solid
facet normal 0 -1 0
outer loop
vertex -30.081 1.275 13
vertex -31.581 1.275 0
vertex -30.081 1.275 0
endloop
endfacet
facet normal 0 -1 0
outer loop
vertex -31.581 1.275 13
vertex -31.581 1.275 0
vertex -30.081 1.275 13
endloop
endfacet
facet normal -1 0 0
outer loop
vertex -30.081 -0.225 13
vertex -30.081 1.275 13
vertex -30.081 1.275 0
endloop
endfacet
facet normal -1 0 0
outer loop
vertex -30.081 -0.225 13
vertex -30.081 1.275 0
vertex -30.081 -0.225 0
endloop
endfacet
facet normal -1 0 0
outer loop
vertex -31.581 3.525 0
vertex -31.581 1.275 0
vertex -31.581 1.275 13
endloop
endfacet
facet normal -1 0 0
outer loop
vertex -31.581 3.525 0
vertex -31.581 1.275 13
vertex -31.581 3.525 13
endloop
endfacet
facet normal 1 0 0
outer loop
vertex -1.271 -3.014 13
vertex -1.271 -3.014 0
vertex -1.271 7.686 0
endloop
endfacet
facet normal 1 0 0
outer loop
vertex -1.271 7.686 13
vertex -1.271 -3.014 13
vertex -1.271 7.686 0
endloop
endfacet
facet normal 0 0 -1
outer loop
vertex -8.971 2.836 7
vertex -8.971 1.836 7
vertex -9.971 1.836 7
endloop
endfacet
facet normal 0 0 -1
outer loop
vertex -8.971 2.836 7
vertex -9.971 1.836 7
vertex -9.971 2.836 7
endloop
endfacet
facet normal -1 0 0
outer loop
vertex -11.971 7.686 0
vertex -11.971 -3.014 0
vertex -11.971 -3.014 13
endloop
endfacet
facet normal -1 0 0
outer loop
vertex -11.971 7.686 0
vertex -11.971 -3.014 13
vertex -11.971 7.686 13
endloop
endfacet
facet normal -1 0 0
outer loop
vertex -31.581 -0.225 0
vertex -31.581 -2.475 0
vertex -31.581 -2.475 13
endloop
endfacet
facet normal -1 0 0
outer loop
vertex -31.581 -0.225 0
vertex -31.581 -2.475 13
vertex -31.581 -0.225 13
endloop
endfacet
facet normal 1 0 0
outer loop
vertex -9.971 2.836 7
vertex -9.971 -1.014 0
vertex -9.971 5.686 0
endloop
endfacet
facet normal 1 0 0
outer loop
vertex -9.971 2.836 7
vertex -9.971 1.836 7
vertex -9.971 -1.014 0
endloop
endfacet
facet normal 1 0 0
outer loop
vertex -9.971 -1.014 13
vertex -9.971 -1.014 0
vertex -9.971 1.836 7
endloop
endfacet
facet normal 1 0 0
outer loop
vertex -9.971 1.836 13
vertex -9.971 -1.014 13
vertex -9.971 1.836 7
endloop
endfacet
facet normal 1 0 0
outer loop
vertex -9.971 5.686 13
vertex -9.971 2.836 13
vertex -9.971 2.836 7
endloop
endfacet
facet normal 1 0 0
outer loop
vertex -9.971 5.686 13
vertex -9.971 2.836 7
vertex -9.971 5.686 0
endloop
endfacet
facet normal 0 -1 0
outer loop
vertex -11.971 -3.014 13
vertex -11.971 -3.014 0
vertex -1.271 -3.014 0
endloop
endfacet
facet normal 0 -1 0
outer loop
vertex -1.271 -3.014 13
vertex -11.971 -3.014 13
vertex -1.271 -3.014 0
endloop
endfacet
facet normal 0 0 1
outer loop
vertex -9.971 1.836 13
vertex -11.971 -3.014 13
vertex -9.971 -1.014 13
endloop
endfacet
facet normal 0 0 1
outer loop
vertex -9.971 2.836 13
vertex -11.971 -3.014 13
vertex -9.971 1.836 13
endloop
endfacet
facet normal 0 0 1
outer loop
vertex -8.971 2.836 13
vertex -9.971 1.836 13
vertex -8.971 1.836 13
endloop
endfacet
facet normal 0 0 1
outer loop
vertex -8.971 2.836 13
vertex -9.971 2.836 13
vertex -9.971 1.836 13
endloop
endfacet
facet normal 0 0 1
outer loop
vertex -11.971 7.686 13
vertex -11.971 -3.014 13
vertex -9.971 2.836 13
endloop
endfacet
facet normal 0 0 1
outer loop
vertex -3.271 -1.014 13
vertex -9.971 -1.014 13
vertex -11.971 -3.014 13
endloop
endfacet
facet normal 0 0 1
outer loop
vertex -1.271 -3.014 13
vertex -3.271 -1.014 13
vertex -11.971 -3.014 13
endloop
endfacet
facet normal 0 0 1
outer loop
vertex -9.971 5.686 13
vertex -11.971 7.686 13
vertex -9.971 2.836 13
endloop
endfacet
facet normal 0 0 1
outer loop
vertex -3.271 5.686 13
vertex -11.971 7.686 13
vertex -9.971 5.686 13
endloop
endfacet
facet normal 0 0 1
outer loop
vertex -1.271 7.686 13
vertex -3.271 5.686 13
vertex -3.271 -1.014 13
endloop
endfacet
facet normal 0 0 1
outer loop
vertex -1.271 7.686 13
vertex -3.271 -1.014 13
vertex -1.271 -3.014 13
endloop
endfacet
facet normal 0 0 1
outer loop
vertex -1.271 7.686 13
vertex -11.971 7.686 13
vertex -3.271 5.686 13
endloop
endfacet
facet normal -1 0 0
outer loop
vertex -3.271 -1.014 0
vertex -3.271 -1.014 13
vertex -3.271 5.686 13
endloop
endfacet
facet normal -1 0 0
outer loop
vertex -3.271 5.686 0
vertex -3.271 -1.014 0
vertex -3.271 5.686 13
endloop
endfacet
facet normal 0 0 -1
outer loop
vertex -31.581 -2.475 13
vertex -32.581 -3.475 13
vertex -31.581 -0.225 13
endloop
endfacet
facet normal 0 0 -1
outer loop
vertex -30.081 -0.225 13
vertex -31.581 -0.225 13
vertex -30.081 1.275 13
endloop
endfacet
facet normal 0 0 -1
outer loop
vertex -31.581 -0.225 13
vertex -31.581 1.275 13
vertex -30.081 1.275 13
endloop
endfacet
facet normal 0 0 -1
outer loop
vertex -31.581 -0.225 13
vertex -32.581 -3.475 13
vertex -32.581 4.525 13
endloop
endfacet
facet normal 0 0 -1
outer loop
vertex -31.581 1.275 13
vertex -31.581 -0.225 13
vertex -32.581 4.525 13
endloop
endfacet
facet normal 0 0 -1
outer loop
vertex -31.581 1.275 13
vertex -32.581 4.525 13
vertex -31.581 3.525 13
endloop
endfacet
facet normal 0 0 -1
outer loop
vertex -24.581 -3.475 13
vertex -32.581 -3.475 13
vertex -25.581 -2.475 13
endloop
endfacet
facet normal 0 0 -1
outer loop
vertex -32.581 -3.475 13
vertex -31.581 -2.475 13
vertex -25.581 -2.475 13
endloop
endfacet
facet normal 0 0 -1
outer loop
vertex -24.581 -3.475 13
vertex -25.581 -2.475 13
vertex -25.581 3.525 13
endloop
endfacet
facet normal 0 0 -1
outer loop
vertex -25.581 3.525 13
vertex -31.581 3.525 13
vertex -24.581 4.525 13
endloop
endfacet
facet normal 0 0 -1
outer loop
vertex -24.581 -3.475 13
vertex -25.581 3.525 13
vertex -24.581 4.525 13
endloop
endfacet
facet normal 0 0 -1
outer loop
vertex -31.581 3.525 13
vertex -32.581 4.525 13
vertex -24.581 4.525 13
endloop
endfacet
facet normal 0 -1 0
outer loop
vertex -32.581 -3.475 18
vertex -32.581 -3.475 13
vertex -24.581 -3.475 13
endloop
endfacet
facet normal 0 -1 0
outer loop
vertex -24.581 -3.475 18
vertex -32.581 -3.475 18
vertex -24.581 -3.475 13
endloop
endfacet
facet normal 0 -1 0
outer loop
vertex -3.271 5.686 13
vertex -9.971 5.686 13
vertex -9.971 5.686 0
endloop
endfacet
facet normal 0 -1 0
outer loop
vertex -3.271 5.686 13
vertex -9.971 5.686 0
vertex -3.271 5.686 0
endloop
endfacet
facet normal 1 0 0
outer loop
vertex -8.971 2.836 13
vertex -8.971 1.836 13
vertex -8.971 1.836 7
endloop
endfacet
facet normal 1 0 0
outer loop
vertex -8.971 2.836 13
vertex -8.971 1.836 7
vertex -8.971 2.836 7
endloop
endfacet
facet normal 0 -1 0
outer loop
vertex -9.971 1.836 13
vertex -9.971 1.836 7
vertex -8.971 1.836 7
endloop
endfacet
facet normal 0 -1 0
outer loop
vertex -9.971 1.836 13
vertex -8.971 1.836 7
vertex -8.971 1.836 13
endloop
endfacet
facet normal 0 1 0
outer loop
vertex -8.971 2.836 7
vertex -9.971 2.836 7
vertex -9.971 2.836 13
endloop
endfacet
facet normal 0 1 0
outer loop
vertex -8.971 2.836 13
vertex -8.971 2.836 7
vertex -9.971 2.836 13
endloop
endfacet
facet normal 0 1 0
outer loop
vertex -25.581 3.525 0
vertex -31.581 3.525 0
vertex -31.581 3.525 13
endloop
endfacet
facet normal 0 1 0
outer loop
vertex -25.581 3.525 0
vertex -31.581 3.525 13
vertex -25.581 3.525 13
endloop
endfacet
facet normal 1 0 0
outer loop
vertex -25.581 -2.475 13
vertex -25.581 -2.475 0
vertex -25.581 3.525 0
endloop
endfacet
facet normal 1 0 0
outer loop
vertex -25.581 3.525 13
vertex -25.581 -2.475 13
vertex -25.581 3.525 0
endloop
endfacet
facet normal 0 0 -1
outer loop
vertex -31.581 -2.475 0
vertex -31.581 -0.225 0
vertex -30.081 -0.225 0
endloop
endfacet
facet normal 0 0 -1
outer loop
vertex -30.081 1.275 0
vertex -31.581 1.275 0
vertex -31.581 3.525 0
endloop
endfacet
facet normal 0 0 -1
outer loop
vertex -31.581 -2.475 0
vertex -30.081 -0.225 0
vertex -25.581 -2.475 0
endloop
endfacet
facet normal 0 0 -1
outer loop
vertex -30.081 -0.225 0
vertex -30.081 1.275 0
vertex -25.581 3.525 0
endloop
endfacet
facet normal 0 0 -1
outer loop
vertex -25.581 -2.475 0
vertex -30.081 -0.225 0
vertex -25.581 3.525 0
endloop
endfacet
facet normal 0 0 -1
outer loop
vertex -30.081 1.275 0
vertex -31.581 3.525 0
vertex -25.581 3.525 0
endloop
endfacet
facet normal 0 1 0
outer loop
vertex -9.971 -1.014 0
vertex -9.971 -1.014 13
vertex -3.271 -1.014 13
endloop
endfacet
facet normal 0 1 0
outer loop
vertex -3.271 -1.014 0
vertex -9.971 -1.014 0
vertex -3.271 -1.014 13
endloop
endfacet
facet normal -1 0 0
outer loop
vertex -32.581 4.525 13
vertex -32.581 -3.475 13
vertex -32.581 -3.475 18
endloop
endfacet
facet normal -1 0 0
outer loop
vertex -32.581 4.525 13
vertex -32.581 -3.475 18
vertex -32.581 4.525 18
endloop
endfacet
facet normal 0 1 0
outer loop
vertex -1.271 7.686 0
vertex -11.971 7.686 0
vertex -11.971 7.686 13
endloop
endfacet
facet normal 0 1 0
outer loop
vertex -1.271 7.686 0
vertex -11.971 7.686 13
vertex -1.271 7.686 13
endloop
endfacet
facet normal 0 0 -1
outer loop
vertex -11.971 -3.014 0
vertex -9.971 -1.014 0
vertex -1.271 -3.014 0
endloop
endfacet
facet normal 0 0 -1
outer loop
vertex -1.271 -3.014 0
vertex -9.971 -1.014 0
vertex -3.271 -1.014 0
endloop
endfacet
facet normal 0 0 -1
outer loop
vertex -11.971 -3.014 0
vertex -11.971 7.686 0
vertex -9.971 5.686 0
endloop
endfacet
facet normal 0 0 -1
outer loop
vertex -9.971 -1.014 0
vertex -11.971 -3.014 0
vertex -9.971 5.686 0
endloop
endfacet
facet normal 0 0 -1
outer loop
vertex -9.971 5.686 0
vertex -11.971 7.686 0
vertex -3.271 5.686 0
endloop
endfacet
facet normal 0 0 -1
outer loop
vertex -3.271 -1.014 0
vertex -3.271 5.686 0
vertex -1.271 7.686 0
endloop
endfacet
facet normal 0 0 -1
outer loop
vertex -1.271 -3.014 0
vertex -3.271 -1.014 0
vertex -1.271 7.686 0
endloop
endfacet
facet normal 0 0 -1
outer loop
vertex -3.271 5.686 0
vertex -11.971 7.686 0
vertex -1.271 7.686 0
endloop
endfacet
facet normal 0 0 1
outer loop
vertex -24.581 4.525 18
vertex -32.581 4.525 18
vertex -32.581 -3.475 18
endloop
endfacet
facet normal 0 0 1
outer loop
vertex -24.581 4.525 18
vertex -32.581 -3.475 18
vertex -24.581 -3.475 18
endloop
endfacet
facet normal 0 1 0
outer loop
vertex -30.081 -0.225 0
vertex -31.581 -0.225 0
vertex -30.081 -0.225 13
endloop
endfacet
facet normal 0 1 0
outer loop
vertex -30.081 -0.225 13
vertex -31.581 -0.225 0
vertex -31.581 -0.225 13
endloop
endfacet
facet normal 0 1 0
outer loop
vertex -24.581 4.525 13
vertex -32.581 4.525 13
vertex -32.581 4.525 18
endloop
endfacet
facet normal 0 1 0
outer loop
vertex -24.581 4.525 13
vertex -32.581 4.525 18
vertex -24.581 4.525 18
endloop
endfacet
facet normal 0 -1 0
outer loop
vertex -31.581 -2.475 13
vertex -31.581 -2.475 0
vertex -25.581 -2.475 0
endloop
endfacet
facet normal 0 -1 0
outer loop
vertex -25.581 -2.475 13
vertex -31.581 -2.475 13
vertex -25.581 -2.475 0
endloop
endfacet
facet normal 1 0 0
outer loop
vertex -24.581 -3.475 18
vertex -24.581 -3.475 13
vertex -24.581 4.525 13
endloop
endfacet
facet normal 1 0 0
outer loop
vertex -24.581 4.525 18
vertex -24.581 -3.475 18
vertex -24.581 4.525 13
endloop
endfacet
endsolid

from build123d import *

# Parameters (mm, degrees)
F0_W      = 10.7
F0_H      = 10.7
F1_DEPTH  = 13
F2_T      = -2
F3_DEPTH  = 25
F4_W      = 6
F4_H      = 6
F5_DEPTH  = 13
F6_W      = 8
F6_H      = 8
F6_W_2    = 6
F6_H_2    = 6
F7_DEPTH  = 5
F8_DEPTH  = 5
F9_W      = 1
F9_H      = 13
F10_DEPTH = 1
F11_W     = 1
F11_H     = 7
F12_DEPTH = 1
F13_W     = 1.5
F13_H     = 13
F14_DEPTH = 1.5


with BuildPart() as f1:
    # F0 (on Top) → F1 (new body)
    with BuildSketch(Plane.XY):
        with Locations((-6.6214689702, 2.3361916789)):
            Rectangle(F0_W, F0_H)
    extrude(amount=F1_DEPTH)

    # F2
    f2_openings = [f1.faces().sort_by_distance(p)[0] for p in [
        (-6.621469, 2.336192, 13),
    ]]
    offset(amount=F2_T, openings=f2_openings)

    # F3 (cut): a face of the model
    f3_faces = [f1.faces().sort_by_distance(p)[0] for p in [
        (-6.6214689702, 2.3361916789, 2),
    ]]
    extrude(f3_faces, amount=-F3_DEPTH, mode=Mode.SUBTRACT)

    # F9 (on face) → F10 (join)
    with BuildSketch(Plane.YZ.offset(-9.9714689702)):
        with Locations((2.3361916789, 6.5)):
            Rectangle(F9_W, F9_H)
    extrude(amount=F10_DEPTH)

    # F11 (on face) → F12 (cut)
    with BuildSketch(Plane.YZ.offset(-8.9714689702)):
        with Locations((2.3361916789, 3.5)):
            Rectangle(F11_W, F11_H)
    extrude(amount=-F12_DEPTH, mode=Mode.SUBTRACT)


with BuildPart() as f5:
    # F4 (on Top) → F5 (new body)
    with BuildSketch(Plane.XY):
        with Locations((-28.5814577192, 0.5250083055)):
            Rectangle(F4_W, F4_H)
    extrude(amount=F5_DEPTH)

    # F6 (on face) → F7 (join)
    with BuildSketch(Plane.XY.offset(13)):
        with Locations((-28.5814577192, 0.5250083055)):
            Rectangle(F6_W, F6_H)
        with Locations((-28.5814577192, 0.5250083055)):
            Rectangle(F6_W_2, F6_H_2, mode=Mode.SUBTRACT)
    extrude(amount=F7_DEPTH)

    # F8 (add): a face of the model
    f8_faces = [f5.faces().sort_by_distance(p)[0] for p in [
        (-28.5814577192, 0.5250083055, 13),
    ]]
    extrude(f8_faces, amount=F8_DEPTH)

    # F13 (on face) → F14 (cut)
    with BuildSketch(Plane(origin=(-31.5814577192, 0, 0), x_dir=(0, -1, 0), z_dir=(-1, 0, 0))):
        with Locations((-0.5250083055, 6.5)):
            Rectangle(F13_W, F13_H)
    extrude(amount=-F14_DEPTH, mode=Mode.SUBTRACT)


solid = Compound([f1.part, f5.part])
